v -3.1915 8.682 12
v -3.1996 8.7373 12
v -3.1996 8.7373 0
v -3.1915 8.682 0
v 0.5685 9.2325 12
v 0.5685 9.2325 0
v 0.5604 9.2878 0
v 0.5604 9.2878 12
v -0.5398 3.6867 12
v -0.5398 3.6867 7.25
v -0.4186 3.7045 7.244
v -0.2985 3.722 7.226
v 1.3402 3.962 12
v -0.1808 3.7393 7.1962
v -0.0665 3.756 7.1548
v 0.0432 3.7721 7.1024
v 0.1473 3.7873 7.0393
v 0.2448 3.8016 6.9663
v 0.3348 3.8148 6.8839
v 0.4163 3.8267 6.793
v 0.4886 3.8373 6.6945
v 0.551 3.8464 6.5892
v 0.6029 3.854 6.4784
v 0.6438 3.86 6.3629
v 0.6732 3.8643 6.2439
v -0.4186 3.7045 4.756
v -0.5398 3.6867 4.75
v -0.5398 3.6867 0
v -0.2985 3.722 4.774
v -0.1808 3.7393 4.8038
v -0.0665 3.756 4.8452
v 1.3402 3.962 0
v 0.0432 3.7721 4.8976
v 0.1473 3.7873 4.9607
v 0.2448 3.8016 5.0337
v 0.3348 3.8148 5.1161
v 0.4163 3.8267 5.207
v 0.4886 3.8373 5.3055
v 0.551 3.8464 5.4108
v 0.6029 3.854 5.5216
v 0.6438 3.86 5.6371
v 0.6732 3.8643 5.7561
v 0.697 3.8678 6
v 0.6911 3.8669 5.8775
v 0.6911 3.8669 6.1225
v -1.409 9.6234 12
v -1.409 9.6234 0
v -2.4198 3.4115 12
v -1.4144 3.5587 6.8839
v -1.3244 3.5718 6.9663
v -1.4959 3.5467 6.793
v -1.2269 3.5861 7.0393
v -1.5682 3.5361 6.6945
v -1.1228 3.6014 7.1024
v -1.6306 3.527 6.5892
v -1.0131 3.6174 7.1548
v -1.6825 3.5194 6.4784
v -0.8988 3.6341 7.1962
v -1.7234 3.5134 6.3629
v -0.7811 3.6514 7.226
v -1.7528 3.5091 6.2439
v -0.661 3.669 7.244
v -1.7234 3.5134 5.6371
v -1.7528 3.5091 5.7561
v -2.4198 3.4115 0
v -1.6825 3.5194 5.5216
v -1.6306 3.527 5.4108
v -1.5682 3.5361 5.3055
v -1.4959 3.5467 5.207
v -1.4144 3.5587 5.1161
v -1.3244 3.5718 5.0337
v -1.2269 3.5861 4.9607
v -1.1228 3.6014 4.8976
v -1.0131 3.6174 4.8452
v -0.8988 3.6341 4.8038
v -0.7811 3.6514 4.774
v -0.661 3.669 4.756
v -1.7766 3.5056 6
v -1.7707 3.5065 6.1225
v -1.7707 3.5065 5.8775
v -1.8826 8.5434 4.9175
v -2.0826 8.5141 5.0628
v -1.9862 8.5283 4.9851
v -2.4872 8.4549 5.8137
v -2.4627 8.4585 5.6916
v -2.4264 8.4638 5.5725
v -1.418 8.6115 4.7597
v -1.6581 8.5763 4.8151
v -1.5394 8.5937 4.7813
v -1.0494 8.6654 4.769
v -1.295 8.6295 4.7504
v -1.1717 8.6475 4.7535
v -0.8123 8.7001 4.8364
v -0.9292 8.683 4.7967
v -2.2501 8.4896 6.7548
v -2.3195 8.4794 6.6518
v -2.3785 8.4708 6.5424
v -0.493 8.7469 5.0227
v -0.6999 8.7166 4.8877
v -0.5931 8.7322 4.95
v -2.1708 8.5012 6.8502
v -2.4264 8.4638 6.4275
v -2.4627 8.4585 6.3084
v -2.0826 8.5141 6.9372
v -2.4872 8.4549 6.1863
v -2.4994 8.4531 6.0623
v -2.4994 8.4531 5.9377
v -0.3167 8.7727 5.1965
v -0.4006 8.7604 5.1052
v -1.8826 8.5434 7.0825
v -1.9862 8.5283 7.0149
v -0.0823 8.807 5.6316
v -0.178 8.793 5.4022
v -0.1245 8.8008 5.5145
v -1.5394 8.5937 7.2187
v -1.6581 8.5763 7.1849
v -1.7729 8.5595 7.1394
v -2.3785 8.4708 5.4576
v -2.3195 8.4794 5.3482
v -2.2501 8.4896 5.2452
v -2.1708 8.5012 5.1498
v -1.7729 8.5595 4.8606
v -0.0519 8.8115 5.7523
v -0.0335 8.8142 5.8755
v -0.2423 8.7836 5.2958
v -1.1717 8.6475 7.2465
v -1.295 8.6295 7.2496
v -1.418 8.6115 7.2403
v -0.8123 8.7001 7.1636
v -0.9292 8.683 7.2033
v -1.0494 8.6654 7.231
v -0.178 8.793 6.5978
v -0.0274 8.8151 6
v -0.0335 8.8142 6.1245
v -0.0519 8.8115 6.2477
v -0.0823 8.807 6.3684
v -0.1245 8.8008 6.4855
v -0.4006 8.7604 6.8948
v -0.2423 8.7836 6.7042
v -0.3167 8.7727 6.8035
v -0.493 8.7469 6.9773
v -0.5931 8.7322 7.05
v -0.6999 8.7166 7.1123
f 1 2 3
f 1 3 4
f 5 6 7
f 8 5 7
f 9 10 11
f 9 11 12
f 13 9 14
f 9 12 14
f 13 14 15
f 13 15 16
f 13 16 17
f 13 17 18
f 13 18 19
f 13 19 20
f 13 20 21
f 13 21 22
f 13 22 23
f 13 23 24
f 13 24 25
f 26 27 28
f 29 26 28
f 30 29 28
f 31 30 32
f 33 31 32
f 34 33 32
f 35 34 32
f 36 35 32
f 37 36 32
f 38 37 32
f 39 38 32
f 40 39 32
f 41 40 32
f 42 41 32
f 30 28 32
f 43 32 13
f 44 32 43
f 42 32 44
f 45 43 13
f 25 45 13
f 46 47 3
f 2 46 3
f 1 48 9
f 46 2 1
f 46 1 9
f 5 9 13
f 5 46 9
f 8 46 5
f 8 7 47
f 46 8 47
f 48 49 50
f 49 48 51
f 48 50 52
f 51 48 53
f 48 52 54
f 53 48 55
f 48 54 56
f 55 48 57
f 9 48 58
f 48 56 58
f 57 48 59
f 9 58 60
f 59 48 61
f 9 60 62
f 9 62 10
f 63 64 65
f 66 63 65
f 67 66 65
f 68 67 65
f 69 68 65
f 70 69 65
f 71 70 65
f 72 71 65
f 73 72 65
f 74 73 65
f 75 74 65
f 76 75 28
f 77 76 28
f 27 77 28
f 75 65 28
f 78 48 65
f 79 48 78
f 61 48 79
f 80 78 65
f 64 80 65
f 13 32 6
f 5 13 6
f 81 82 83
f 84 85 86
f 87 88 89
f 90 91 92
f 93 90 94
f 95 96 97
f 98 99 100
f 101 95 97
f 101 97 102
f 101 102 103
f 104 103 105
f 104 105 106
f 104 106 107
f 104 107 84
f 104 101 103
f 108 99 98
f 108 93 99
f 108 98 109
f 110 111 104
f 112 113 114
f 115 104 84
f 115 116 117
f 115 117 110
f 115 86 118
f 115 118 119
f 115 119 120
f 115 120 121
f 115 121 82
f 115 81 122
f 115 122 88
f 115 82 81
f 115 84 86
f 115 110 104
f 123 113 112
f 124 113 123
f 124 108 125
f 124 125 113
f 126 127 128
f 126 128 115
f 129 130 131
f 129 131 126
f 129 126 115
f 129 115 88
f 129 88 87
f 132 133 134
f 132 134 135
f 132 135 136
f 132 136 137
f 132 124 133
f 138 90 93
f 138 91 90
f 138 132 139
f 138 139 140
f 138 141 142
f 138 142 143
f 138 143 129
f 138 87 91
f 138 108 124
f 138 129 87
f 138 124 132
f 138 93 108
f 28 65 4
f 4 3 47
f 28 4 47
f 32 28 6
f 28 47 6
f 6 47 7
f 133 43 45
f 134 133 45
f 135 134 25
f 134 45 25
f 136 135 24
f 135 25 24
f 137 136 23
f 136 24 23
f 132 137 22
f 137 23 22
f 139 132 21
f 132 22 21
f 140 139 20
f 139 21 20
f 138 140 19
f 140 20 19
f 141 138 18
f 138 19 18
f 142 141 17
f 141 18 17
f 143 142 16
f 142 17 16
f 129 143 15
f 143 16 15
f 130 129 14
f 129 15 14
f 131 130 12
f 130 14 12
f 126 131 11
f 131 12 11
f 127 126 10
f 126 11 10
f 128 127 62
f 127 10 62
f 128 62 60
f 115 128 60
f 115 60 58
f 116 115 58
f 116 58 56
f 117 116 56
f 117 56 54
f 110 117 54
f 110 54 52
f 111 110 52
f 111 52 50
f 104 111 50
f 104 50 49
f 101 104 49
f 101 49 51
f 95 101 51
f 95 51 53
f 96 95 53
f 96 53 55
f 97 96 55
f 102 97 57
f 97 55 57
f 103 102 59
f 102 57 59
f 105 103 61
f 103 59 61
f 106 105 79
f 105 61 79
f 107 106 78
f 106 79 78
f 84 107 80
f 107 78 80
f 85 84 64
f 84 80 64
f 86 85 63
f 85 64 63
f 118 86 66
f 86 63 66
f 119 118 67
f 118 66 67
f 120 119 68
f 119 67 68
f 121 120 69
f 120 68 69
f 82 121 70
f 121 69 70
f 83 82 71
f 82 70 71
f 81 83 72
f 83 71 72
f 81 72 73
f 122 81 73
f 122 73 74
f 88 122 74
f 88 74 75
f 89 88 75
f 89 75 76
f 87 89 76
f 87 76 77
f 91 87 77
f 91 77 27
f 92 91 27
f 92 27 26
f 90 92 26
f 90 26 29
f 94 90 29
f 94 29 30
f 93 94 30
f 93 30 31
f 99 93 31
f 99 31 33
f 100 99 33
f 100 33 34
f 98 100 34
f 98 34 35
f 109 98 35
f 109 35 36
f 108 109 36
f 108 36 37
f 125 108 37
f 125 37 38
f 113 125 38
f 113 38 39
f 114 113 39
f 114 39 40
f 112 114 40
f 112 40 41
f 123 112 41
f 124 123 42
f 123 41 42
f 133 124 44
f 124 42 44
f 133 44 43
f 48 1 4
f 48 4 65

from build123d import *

# Parameters (mm, degrees)
F1_DEPTH = 12
F2_R     = 1.25
F3_DEPTH = 5


with BuildPart() as f1:
    # F0 (on Top) → F1 (new body)
    with BuildSketch(Plane.XY):
        with BuildLine():
            Line((-0.5398019886, 3.6867167497), (-1.340078938, 9.1524143503))
            ThreePointArc((-1.340078938, 9.1524143503), (-2.2779450693, 8.9651249998), (-3.19145978, 8.6819977236))
            Line((-3.19145978, 8.6819977236), (-2.4197573686, 3.4114572922))
            Line((-2.4197573686, 3.4114572922), (-0.5398019886, 3.6867167497))
        make_face()
        with BuildLine():
            Line((1.3401533915, 3.9619762073), (0.5684509802, 9.2325166387))
            ThreePointArc((0.5684509802, 9.2325166387), (-0.3878872523, 9.2418636367), (-1.340078938, 9.1524143503))
            Line((-1.340078938, 9.1524143503), (-0.5398019886, 3.6867167497))
            Line((-0.5398019886, 3.6867167497), (1.3401533915, 3.9619762073))
        make_face()
        with BuildLine():
            ThreePointArc((-1.340078938, 9.1524143503), (-0.3878872523, 9.2418636367), (0.5684509802, 9.2325166387))
            Line((0.5684509802, 9.2325166387), (0.5603502186, 9.2878428764))
            Line((0.5603502186, 9.2878428764), (-1.4090423808, 9.6234179499))
            Line((-1.4090423808, 9.6234179499), (-1.340078938, 9.1524143503))
        make_face()
        with BuildLine():
            ThreePointArc((-3.19145978, 8.6819977236), (-2.2779450693, 8.9651249998), (-1.340078938, 9.1524143503))
            Line((-1.340078938, 9.1524143503), (-1.4090423808, 9.6234179499))
            Line((-1.4090423808, 9.6234179499), (-3.1995605415, 8.7373239614))
            Line((-3.1995605415, 8.7373239614), (-3.19145978, 8.6819977236))
        make_face()
    extrude(amount=F1_DEPTH)

    # F2 (on face) → F3 (cut)
    with BuildSketch(Plane(origin=(-0.5398019886, 3.6867167497, 0), x_dir=(0.9894502, 0.1448733987, 0), z_dir=(0.1448733987, -0.9894502, 0))):
        with Locations((0, 6)):
            Circle(F2_R)
    extrude(amount=-F3_DEPTH, mode=Mode.SUBTRACT)


solid = f1.part
